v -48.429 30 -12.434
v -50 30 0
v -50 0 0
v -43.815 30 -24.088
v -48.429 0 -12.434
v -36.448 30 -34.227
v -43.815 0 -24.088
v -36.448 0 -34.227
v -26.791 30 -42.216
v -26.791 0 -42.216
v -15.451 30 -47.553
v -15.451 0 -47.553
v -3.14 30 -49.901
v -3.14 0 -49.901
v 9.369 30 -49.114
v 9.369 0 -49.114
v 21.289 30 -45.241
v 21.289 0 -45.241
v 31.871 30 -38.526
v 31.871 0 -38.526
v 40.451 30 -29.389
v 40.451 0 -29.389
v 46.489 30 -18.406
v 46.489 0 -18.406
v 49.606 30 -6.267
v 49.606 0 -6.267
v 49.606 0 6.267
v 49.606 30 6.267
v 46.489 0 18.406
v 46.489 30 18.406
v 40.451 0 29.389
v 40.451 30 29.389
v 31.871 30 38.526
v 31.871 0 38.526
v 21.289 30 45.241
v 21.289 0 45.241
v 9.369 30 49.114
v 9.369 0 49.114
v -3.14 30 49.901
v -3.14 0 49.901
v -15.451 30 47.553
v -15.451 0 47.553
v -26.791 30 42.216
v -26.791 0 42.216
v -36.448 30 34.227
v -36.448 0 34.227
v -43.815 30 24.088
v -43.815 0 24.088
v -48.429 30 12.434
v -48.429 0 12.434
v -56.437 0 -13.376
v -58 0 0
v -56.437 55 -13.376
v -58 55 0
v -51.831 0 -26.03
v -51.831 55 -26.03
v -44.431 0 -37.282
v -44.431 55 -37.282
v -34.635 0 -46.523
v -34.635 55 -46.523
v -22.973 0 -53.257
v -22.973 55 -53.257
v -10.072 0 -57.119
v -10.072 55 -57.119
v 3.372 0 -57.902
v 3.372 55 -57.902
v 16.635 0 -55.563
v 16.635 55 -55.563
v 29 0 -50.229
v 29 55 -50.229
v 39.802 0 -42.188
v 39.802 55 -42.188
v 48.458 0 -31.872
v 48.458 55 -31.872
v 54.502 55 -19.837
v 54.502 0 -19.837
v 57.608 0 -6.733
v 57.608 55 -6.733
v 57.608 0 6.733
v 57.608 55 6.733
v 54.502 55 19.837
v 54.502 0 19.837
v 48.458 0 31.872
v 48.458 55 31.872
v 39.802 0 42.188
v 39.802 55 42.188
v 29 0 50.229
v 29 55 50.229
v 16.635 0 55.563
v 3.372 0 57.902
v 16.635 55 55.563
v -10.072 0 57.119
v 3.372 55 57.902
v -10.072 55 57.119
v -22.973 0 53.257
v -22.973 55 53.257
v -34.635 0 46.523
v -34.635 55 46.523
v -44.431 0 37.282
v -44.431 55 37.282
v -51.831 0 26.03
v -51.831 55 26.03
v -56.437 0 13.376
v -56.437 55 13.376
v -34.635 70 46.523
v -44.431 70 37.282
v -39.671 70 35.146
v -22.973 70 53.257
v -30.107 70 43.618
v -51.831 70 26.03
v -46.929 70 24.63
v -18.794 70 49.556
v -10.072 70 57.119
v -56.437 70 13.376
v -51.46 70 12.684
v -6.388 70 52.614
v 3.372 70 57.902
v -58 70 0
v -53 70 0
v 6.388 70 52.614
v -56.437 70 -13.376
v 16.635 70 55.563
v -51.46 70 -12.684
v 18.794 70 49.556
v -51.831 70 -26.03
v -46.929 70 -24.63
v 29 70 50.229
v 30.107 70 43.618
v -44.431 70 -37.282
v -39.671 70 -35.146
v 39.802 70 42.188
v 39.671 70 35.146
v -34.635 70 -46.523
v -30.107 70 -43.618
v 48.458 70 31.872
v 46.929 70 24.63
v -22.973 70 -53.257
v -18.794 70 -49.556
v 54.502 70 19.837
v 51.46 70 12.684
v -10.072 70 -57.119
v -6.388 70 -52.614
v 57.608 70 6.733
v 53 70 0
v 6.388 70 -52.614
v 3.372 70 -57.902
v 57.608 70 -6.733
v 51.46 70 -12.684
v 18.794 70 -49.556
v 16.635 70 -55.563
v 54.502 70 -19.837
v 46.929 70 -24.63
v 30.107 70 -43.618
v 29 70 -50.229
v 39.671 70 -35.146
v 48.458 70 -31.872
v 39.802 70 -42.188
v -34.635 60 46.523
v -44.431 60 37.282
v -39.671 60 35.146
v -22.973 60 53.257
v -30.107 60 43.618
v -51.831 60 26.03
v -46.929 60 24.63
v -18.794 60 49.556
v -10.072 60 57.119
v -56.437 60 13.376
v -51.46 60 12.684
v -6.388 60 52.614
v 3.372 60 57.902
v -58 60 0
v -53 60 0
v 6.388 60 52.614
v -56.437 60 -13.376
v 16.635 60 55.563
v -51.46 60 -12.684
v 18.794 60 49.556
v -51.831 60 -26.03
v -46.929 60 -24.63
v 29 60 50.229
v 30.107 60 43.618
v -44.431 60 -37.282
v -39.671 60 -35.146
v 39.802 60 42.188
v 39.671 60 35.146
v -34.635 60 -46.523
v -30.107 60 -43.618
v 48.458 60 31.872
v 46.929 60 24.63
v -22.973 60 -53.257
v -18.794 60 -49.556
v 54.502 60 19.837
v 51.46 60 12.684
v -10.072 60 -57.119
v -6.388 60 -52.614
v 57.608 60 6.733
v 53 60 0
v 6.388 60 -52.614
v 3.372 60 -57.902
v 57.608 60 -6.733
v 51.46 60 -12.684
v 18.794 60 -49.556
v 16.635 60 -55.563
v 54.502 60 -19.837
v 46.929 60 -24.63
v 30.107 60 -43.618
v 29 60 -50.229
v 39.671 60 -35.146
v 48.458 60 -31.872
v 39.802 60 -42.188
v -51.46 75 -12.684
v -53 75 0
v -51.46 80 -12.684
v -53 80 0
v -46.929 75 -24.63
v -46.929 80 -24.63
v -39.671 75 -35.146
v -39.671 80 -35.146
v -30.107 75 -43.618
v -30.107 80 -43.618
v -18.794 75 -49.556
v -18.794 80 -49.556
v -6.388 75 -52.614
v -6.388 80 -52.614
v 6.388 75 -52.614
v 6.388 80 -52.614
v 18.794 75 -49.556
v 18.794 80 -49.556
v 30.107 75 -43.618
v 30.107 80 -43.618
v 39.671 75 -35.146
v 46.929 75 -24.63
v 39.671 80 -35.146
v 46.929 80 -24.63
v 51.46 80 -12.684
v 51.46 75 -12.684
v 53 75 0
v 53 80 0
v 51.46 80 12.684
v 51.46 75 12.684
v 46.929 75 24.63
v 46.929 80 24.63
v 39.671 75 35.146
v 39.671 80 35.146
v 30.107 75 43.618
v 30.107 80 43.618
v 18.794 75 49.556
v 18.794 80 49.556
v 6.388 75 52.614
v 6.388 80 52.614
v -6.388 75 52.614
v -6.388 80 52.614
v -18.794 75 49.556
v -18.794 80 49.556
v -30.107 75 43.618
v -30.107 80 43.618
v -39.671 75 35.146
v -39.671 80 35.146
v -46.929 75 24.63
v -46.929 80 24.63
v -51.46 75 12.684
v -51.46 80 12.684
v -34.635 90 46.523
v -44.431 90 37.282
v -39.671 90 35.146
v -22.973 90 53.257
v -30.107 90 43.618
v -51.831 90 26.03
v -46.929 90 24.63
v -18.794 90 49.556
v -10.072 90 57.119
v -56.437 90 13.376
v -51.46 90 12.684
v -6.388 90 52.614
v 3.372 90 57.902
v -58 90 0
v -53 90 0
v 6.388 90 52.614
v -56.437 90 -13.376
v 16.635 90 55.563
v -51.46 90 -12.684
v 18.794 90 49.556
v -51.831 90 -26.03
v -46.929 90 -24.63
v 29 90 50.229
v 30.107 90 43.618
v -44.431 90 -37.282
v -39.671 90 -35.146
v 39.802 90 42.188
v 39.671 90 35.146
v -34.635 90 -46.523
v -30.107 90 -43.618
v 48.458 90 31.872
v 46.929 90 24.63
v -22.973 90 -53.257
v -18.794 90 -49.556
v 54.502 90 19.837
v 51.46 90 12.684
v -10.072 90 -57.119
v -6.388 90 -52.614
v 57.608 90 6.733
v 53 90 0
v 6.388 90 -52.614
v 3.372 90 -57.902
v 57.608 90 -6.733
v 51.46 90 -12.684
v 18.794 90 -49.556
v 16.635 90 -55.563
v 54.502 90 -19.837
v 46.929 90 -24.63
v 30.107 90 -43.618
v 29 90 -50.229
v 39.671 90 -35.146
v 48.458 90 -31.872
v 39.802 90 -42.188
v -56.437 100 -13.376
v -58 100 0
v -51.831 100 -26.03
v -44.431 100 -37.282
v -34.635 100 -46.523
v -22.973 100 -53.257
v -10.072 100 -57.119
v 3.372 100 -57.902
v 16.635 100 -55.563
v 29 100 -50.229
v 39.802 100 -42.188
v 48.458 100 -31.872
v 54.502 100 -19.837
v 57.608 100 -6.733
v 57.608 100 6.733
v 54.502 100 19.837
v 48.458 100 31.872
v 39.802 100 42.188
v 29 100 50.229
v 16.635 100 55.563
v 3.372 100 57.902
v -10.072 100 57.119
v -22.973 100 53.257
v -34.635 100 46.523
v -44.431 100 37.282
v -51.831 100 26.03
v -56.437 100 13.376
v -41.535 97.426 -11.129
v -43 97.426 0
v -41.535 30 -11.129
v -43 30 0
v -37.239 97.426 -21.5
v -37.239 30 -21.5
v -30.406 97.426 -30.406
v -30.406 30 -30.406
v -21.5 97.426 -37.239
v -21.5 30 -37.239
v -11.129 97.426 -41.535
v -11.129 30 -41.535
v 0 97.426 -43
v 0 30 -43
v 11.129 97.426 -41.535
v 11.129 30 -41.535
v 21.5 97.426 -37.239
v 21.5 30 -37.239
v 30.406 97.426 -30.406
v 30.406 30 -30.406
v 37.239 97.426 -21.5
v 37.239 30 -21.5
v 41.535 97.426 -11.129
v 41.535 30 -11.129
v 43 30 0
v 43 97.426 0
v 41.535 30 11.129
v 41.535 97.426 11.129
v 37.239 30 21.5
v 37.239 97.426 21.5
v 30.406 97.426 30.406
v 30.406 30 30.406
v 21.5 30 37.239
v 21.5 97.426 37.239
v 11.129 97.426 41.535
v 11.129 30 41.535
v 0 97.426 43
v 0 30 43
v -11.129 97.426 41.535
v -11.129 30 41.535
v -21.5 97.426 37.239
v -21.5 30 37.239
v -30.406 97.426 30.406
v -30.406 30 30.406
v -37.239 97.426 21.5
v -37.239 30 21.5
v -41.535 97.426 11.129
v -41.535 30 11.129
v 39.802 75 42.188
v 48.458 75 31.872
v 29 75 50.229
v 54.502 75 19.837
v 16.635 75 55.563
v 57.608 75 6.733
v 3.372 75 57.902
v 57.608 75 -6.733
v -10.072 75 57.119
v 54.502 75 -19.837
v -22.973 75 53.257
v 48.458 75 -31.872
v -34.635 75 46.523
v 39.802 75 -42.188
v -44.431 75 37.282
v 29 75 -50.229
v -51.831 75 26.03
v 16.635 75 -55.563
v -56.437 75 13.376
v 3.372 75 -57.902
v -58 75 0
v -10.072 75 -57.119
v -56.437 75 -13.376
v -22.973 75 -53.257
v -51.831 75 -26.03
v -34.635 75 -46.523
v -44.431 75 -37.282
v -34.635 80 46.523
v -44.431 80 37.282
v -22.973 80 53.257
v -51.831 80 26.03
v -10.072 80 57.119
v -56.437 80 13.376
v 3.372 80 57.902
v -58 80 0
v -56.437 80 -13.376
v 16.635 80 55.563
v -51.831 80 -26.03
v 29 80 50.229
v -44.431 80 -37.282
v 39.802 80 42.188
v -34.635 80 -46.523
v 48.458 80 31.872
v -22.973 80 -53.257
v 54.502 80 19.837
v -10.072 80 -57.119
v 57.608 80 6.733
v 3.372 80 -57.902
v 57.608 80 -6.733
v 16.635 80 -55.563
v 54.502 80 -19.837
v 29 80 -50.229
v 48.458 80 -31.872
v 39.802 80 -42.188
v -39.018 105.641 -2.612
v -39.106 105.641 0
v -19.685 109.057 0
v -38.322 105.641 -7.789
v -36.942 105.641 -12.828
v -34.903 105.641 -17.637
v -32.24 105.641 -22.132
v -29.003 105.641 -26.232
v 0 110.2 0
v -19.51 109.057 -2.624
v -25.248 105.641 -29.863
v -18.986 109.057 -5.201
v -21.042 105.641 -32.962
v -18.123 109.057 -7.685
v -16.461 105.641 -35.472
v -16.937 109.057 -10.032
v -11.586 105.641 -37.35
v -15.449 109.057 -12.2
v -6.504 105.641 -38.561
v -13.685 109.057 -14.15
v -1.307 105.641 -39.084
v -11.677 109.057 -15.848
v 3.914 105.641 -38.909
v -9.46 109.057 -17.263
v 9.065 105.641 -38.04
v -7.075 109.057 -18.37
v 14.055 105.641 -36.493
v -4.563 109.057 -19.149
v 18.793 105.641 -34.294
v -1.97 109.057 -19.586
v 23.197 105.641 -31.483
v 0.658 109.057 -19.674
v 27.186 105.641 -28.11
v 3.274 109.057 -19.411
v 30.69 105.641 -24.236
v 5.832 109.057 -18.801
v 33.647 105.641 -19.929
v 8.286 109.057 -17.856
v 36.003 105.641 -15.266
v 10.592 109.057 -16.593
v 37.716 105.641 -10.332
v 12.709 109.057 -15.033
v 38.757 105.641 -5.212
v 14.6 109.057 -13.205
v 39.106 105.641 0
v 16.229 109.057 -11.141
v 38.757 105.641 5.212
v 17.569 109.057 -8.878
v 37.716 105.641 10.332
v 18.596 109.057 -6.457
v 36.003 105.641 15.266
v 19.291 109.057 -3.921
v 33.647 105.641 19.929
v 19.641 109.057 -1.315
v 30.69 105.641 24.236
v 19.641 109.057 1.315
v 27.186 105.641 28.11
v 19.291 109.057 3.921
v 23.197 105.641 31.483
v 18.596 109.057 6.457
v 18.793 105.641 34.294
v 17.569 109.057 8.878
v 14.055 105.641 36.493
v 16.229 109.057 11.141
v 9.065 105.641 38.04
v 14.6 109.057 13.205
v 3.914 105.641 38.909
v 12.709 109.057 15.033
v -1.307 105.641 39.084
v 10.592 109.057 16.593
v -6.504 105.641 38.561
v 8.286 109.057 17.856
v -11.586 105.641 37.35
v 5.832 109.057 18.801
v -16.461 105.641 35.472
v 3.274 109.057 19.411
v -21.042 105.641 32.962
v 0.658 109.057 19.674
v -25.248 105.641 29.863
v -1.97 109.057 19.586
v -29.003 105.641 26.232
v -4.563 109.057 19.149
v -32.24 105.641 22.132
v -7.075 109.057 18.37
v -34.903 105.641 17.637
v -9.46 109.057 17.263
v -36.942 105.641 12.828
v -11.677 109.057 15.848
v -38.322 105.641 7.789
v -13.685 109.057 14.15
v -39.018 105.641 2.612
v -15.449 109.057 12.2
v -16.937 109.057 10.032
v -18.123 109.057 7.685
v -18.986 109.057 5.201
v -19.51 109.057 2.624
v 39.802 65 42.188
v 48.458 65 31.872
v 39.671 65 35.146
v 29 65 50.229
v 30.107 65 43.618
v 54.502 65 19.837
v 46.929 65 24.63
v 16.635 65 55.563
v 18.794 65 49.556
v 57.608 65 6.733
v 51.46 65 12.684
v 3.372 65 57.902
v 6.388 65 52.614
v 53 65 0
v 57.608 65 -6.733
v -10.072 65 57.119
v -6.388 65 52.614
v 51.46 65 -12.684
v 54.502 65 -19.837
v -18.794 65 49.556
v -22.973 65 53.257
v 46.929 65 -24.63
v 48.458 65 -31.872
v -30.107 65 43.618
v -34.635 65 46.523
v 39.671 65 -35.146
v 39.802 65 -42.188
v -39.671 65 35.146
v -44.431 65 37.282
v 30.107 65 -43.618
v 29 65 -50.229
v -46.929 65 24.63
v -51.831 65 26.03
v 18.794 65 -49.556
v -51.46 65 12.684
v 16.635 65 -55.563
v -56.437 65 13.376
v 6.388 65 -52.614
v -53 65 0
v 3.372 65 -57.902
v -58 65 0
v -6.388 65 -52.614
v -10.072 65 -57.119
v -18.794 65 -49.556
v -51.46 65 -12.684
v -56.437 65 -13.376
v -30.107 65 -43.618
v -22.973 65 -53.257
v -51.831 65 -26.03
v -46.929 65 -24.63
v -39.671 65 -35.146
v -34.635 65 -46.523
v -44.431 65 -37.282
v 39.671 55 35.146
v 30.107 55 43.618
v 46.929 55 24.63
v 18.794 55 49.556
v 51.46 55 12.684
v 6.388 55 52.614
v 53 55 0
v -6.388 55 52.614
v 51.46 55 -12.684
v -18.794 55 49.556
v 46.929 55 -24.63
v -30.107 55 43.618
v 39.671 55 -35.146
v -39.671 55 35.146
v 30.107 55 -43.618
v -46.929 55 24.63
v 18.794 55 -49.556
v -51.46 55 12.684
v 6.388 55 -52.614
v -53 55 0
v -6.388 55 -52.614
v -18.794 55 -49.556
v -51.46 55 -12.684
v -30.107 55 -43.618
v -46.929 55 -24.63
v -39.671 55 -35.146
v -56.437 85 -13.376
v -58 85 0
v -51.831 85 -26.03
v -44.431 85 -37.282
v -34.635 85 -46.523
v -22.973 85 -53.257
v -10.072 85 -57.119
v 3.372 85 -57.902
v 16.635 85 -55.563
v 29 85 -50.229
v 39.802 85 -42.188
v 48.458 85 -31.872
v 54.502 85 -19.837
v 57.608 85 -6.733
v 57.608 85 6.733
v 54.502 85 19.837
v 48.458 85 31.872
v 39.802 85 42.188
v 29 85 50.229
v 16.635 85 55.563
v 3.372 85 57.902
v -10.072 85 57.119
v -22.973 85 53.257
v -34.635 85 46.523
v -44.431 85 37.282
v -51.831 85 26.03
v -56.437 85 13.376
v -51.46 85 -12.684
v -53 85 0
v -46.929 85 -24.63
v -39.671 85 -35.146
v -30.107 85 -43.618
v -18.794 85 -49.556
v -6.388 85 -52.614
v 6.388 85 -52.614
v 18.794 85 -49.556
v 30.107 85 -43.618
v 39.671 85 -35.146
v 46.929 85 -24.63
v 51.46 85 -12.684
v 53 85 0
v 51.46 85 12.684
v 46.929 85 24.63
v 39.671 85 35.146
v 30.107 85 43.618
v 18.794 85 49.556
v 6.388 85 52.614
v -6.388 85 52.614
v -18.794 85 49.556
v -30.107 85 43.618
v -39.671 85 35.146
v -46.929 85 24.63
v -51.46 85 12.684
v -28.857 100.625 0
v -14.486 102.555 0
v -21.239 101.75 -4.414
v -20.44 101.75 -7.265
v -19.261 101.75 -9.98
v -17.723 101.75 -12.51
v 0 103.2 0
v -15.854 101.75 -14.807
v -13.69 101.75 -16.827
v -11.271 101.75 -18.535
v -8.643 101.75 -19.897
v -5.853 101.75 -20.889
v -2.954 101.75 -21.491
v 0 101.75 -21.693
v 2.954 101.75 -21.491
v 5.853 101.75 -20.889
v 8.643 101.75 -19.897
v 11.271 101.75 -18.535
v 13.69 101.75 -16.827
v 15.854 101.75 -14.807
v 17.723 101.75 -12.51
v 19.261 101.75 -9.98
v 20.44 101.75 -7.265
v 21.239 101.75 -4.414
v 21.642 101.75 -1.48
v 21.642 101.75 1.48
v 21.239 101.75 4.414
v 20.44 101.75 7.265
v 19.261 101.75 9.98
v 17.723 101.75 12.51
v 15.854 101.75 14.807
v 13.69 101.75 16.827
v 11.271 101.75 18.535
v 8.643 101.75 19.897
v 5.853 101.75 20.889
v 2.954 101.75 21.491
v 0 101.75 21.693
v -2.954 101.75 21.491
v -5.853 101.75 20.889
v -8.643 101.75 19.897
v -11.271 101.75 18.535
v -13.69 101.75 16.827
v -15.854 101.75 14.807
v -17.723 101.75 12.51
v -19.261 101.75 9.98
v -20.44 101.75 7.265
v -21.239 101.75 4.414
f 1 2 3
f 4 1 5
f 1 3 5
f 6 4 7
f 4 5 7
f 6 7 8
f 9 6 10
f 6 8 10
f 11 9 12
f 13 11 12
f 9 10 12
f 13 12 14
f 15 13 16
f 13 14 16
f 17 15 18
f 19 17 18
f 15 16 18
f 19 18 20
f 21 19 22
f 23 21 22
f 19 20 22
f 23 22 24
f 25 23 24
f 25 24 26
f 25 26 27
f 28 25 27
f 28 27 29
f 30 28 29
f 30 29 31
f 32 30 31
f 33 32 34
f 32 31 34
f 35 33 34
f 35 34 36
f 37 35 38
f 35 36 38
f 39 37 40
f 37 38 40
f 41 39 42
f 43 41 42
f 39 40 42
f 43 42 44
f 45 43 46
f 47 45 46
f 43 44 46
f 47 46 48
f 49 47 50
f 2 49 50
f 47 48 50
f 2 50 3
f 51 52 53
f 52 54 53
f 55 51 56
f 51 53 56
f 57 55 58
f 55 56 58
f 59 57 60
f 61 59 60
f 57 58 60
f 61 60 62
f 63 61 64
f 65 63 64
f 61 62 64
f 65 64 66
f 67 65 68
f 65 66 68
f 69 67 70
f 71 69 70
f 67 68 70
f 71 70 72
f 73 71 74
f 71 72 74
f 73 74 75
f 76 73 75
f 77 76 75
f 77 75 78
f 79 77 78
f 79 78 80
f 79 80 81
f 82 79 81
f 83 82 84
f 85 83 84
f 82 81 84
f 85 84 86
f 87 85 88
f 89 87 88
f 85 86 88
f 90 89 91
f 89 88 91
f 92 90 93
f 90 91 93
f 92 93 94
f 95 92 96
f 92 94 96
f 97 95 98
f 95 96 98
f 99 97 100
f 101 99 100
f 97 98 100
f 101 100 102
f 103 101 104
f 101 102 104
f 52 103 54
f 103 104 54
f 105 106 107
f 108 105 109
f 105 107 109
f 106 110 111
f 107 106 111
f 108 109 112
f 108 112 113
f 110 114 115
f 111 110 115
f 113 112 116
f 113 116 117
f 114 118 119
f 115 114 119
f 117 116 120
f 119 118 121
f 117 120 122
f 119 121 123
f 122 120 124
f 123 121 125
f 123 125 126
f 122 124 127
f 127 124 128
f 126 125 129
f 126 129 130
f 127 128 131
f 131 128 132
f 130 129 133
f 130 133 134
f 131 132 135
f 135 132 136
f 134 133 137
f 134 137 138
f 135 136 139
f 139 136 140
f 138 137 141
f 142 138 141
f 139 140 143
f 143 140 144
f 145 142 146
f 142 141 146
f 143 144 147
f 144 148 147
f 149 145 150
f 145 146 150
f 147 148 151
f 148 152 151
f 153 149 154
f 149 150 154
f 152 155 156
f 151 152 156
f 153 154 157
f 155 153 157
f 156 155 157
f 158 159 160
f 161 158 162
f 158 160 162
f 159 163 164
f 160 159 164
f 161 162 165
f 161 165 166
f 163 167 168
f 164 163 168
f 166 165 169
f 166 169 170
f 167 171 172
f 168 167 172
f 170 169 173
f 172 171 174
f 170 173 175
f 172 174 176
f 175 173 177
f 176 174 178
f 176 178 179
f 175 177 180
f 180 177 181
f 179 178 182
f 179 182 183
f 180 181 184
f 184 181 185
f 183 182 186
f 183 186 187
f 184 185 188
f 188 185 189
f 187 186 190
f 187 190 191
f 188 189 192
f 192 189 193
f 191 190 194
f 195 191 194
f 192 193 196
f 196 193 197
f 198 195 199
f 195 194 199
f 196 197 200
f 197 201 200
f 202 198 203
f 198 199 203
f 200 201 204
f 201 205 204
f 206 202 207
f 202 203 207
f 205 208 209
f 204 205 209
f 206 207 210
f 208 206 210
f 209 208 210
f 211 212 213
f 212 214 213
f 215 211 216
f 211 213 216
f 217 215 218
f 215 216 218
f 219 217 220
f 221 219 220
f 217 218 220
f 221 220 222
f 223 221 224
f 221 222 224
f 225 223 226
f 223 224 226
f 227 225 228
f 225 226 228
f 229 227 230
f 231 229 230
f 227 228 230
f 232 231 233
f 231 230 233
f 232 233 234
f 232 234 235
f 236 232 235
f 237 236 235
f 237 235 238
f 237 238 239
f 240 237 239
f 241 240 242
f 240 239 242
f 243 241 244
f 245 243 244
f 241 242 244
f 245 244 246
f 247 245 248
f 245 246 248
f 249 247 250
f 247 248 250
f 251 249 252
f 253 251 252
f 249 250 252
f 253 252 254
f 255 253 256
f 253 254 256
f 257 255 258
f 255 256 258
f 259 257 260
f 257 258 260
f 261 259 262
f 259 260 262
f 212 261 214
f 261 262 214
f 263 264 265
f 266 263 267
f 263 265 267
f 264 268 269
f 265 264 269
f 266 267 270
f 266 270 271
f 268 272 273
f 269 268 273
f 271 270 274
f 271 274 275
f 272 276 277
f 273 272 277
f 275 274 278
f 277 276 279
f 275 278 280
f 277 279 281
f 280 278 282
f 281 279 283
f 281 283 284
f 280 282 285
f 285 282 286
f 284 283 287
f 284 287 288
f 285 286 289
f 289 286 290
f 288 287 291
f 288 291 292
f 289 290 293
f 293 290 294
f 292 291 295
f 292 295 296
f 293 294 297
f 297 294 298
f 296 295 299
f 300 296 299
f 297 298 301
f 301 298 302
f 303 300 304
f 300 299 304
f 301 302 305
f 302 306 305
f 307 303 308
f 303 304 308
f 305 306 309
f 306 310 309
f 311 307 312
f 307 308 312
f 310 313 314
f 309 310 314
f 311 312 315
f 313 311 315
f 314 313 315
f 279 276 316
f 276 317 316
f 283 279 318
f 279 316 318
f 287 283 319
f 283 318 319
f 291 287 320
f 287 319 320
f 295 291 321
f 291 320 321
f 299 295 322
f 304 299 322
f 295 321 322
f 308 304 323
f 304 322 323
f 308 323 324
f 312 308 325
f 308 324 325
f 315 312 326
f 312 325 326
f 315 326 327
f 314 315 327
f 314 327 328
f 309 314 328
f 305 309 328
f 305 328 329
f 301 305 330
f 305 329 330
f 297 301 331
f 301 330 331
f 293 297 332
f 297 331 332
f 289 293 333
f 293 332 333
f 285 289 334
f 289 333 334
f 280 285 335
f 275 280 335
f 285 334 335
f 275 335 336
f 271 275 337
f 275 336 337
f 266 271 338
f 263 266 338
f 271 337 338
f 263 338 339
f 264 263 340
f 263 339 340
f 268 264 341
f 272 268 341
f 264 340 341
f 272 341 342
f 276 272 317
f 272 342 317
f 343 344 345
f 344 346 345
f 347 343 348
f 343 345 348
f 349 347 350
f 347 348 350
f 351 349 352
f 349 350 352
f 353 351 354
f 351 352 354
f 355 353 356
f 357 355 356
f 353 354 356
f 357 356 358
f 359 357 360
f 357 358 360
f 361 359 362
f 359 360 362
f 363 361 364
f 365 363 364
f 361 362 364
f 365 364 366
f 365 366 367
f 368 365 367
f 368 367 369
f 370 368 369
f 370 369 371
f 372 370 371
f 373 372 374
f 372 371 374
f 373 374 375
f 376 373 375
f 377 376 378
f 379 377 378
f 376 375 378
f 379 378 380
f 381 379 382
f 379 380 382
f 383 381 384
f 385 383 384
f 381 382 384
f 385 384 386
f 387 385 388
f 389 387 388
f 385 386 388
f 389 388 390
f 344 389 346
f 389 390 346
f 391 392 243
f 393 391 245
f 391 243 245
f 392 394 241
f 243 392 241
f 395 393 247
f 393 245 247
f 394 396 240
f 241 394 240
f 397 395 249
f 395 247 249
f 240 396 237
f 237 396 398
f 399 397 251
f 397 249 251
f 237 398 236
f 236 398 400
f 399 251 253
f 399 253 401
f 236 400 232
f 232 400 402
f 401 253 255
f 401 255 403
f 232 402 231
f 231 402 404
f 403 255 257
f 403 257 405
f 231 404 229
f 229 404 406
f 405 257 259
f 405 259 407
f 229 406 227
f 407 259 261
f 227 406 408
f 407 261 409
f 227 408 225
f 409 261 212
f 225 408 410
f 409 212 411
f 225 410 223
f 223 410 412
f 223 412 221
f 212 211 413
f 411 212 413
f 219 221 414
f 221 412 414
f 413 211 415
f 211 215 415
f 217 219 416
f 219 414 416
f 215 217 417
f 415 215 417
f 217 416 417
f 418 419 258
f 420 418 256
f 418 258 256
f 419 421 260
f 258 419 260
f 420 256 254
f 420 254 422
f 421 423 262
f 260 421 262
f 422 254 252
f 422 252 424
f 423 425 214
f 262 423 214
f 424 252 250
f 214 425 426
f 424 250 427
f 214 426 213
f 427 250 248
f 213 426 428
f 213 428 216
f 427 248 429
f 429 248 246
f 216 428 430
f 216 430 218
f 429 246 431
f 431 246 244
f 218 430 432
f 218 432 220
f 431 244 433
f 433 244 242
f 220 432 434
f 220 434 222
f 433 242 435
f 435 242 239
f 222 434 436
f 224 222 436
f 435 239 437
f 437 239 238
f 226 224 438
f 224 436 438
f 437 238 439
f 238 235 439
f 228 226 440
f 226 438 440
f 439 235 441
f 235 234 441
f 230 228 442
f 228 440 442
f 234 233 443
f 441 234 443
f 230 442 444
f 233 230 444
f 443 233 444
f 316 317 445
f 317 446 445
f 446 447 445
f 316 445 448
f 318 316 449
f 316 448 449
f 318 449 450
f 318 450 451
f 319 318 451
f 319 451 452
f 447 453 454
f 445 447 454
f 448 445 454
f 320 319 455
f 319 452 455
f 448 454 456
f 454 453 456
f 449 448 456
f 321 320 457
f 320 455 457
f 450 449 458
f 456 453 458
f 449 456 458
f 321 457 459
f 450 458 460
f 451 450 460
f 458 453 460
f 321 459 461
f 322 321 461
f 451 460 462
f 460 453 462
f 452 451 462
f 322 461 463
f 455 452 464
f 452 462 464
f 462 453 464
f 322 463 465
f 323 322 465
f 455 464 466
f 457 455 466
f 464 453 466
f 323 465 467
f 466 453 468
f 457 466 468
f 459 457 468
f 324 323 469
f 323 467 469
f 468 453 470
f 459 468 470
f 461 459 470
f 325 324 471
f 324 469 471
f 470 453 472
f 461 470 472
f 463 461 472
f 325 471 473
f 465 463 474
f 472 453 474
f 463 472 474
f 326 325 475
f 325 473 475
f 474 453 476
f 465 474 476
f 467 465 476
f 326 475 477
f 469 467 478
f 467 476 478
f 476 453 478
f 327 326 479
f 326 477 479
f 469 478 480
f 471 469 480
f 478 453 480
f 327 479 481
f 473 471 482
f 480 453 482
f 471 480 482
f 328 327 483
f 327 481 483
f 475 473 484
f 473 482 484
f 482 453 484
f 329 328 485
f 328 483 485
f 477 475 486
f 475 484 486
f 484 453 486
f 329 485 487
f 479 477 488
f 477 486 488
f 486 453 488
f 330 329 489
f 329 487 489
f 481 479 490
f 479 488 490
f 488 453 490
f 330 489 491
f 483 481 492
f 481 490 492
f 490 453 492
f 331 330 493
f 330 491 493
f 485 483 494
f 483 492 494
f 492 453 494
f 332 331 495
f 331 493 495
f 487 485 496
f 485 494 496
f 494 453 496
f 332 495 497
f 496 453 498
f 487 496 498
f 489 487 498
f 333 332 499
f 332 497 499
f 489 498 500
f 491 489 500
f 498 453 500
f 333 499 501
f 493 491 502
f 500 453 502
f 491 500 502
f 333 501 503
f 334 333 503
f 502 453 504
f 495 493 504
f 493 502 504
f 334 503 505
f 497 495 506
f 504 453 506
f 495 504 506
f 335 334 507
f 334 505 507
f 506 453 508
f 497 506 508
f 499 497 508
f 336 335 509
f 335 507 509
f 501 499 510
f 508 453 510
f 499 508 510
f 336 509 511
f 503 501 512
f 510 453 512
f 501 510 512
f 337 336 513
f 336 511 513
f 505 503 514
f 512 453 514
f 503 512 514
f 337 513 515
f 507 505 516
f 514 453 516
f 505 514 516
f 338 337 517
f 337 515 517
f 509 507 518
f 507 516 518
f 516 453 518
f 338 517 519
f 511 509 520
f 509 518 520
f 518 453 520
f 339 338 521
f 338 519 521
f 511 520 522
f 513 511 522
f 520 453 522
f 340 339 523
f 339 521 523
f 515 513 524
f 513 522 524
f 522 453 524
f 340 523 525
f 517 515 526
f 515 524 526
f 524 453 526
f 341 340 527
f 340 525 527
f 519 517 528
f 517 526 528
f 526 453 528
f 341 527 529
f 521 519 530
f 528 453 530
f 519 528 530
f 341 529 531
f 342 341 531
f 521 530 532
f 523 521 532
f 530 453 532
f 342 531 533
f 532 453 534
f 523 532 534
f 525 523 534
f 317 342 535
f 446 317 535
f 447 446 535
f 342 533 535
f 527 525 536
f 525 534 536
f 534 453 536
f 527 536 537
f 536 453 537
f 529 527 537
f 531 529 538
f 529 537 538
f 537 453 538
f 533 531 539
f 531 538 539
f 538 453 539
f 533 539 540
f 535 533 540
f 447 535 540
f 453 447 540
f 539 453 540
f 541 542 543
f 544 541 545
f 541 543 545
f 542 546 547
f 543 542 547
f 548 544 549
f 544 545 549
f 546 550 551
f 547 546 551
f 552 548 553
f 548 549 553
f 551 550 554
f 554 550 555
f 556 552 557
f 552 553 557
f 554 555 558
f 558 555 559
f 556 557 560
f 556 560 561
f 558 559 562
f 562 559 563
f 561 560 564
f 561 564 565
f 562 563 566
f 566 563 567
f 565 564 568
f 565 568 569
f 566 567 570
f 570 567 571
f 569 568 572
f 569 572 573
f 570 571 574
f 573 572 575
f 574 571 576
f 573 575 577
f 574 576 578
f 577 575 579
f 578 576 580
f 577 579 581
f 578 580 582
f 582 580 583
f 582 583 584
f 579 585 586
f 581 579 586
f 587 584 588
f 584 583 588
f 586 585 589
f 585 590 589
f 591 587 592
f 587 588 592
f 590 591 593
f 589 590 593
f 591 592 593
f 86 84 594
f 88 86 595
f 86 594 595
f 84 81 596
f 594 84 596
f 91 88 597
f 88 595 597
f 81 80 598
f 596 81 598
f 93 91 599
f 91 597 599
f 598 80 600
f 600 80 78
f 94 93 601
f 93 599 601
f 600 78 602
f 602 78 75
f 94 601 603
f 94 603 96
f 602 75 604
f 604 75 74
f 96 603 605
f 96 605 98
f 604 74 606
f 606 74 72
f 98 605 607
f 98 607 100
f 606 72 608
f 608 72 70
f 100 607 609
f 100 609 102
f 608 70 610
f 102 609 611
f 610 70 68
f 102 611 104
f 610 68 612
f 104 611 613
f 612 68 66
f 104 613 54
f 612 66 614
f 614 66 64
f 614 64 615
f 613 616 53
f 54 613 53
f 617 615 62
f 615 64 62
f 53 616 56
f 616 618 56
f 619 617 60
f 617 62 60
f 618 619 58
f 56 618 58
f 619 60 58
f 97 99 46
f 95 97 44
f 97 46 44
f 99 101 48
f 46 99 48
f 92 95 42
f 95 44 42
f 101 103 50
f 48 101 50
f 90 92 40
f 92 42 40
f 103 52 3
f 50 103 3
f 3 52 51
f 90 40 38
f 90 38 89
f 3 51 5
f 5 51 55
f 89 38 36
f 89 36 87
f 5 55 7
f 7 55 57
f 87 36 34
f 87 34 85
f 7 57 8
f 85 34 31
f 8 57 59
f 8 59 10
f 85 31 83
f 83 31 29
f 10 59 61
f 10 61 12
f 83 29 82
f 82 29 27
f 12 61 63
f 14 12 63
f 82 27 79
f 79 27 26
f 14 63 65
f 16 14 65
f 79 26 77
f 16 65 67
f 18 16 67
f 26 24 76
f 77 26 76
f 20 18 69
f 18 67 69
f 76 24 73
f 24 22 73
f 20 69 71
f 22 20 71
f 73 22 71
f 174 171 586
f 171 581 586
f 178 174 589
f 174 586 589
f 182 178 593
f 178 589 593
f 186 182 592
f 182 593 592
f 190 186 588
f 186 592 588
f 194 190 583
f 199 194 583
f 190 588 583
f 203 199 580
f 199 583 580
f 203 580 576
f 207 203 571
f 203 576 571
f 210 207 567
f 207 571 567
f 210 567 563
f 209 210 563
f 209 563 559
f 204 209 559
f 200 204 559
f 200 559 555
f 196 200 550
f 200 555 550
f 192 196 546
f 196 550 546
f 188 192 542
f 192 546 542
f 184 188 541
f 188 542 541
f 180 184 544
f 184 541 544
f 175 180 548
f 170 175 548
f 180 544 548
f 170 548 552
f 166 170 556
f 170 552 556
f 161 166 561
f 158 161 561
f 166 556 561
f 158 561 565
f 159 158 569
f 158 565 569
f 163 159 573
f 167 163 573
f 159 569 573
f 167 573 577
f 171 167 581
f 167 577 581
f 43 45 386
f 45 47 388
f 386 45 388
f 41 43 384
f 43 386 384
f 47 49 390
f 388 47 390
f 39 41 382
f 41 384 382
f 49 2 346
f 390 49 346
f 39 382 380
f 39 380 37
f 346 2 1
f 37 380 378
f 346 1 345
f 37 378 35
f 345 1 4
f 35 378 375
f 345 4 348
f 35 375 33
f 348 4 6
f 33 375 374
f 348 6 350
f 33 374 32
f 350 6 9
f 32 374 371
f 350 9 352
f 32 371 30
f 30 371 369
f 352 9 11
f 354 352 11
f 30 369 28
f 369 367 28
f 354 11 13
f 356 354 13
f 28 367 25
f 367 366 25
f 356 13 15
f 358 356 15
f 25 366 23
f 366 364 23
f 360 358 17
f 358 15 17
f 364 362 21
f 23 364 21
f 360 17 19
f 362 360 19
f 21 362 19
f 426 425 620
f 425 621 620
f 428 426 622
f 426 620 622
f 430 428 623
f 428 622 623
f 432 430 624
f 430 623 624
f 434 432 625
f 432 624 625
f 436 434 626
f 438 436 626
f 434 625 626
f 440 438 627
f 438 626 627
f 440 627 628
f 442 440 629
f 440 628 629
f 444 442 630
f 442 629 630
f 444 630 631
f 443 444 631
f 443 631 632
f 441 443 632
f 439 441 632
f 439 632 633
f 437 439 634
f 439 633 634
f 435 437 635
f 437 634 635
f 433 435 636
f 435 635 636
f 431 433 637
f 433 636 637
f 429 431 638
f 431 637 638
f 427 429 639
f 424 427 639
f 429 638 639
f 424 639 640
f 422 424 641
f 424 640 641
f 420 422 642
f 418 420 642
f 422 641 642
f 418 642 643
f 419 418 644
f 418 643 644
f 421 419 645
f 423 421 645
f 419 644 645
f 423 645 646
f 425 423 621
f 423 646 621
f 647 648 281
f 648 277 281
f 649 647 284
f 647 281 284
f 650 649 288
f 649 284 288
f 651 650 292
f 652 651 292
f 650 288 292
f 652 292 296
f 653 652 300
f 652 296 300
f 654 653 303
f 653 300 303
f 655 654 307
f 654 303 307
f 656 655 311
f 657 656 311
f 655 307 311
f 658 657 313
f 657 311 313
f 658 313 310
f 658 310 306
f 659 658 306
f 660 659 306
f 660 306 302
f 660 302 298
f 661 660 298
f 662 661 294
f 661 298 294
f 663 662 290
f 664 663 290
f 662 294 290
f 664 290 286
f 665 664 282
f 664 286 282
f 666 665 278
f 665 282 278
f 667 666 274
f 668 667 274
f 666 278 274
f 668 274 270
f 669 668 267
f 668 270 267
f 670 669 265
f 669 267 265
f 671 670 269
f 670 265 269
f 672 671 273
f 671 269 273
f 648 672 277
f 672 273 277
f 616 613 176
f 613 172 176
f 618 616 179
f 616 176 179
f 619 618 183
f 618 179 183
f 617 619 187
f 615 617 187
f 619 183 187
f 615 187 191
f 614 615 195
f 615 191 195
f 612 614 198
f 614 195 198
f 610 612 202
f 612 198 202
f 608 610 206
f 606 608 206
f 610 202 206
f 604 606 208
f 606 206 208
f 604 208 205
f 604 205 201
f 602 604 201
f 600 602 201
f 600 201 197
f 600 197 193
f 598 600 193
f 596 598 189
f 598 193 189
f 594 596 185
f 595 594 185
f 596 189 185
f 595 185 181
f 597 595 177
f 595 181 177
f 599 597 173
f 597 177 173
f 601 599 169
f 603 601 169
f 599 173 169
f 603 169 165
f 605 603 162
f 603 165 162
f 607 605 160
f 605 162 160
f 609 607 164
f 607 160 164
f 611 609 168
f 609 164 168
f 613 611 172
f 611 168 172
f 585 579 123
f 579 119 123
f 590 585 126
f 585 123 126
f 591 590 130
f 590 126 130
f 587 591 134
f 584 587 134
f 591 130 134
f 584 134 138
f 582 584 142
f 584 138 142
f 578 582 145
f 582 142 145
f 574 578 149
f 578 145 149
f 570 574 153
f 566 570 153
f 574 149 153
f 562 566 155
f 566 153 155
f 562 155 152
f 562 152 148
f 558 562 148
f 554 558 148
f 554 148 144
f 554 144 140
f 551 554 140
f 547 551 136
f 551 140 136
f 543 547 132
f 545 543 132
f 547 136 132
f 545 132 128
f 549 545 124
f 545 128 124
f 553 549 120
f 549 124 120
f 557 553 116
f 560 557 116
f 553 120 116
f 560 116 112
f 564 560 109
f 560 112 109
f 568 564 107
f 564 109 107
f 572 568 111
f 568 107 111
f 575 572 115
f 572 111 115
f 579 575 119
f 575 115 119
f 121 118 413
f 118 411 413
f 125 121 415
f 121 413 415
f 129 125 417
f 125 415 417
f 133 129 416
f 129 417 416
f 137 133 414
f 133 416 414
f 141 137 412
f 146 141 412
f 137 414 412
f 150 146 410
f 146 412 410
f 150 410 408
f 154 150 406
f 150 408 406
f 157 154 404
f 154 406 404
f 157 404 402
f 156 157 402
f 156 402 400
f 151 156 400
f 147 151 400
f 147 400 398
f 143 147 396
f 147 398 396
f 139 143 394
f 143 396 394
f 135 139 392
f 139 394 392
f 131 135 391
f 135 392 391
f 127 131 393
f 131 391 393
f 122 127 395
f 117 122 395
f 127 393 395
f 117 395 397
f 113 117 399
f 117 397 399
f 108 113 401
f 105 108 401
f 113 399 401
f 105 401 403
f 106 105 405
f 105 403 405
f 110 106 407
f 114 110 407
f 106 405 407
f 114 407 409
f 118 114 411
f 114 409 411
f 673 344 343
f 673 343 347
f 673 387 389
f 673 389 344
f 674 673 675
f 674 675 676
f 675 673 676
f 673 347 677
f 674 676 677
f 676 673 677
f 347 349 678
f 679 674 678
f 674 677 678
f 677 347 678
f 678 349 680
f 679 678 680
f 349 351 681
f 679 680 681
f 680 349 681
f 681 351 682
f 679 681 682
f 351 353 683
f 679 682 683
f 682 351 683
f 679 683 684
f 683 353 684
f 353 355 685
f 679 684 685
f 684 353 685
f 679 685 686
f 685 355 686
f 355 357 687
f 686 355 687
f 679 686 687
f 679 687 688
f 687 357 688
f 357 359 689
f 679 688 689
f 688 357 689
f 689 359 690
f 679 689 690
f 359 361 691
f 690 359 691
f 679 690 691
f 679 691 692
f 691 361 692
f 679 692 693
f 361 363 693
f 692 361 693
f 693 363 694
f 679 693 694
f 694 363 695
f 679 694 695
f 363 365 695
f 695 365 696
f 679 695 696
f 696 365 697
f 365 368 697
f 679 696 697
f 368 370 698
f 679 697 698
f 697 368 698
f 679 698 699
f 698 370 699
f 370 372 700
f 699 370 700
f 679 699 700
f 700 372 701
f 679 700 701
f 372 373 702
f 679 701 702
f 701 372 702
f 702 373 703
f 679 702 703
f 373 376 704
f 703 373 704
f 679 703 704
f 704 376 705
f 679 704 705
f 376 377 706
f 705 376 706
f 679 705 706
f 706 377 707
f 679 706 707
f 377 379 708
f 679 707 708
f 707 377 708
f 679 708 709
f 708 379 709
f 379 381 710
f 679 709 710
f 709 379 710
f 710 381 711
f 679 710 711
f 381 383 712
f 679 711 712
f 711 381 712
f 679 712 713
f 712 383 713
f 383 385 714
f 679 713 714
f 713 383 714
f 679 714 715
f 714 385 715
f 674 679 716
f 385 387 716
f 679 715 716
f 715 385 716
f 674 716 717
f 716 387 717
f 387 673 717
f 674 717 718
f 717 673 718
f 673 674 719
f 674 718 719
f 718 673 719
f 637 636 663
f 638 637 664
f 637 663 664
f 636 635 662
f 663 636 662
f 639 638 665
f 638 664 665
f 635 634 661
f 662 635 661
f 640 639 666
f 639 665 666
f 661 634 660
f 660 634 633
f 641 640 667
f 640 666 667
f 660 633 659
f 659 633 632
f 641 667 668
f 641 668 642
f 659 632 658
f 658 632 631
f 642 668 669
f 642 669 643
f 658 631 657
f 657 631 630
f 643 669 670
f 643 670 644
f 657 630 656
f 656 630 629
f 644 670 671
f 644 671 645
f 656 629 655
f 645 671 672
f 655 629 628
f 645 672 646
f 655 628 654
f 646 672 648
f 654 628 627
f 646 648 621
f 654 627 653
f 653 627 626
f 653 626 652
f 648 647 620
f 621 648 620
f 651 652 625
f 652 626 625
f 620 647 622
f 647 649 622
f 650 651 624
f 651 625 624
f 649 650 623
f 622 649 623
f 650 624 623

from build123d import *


with BuildPart() as part:
    # Sketch1 → Revolve1 (revolve)
    with BuildSketch(Plane.XY, mode=Mode.PRIVATE) as revolve1_sk:
        with BuildLine():
            Line((50, 0), (58, 0))
            Line((58, 0), (58, 55))
            Line((58, 55), (53, 55))
            Line((53, 55), (53, 60))
            Line((53, 60), (58, 60))
            Line((58, 60), (58, 65))
            Line((58, 65), (53, 65))
            Line((53, 65), (53, 70))
            Line((53, 70), (58, 70))
            Line((58, 70), (58, 75))
            Line((58, 75), (53, 75))
            Line((53, 75), (53, 80))
            Line((53, 80), (58, 80))
            Line((58, 80), (58, 85))
            Line((58, 85), (53, 85))
            Line((53, 85), (53, 90))
            Line((53, 90), (58, 90))
            Line((58, 90), (58, 100))
            ThreePointArc((58, 100), (29.445044376, 107.630676018), (0, 110.200125156))
            Line((0, 110.200125156), (0, 103.200125156))
            ThreePointArc((0, 103.200125156), (21.692969078, 101.750164131), (43, 97.426077213))
            Line((43, 97.426077213), (43, 30))
            Line((43, 30), (50, 30))
            Line((50, 30), (50, 0))
        make_face()
    revolve(revolve1_sk.sketch.rotate(Axis((0, 0, 0), (0, -1, 0)), 180), axis=Axis((0, 0, 0), (0, -1, 0)))


solid = part.part
